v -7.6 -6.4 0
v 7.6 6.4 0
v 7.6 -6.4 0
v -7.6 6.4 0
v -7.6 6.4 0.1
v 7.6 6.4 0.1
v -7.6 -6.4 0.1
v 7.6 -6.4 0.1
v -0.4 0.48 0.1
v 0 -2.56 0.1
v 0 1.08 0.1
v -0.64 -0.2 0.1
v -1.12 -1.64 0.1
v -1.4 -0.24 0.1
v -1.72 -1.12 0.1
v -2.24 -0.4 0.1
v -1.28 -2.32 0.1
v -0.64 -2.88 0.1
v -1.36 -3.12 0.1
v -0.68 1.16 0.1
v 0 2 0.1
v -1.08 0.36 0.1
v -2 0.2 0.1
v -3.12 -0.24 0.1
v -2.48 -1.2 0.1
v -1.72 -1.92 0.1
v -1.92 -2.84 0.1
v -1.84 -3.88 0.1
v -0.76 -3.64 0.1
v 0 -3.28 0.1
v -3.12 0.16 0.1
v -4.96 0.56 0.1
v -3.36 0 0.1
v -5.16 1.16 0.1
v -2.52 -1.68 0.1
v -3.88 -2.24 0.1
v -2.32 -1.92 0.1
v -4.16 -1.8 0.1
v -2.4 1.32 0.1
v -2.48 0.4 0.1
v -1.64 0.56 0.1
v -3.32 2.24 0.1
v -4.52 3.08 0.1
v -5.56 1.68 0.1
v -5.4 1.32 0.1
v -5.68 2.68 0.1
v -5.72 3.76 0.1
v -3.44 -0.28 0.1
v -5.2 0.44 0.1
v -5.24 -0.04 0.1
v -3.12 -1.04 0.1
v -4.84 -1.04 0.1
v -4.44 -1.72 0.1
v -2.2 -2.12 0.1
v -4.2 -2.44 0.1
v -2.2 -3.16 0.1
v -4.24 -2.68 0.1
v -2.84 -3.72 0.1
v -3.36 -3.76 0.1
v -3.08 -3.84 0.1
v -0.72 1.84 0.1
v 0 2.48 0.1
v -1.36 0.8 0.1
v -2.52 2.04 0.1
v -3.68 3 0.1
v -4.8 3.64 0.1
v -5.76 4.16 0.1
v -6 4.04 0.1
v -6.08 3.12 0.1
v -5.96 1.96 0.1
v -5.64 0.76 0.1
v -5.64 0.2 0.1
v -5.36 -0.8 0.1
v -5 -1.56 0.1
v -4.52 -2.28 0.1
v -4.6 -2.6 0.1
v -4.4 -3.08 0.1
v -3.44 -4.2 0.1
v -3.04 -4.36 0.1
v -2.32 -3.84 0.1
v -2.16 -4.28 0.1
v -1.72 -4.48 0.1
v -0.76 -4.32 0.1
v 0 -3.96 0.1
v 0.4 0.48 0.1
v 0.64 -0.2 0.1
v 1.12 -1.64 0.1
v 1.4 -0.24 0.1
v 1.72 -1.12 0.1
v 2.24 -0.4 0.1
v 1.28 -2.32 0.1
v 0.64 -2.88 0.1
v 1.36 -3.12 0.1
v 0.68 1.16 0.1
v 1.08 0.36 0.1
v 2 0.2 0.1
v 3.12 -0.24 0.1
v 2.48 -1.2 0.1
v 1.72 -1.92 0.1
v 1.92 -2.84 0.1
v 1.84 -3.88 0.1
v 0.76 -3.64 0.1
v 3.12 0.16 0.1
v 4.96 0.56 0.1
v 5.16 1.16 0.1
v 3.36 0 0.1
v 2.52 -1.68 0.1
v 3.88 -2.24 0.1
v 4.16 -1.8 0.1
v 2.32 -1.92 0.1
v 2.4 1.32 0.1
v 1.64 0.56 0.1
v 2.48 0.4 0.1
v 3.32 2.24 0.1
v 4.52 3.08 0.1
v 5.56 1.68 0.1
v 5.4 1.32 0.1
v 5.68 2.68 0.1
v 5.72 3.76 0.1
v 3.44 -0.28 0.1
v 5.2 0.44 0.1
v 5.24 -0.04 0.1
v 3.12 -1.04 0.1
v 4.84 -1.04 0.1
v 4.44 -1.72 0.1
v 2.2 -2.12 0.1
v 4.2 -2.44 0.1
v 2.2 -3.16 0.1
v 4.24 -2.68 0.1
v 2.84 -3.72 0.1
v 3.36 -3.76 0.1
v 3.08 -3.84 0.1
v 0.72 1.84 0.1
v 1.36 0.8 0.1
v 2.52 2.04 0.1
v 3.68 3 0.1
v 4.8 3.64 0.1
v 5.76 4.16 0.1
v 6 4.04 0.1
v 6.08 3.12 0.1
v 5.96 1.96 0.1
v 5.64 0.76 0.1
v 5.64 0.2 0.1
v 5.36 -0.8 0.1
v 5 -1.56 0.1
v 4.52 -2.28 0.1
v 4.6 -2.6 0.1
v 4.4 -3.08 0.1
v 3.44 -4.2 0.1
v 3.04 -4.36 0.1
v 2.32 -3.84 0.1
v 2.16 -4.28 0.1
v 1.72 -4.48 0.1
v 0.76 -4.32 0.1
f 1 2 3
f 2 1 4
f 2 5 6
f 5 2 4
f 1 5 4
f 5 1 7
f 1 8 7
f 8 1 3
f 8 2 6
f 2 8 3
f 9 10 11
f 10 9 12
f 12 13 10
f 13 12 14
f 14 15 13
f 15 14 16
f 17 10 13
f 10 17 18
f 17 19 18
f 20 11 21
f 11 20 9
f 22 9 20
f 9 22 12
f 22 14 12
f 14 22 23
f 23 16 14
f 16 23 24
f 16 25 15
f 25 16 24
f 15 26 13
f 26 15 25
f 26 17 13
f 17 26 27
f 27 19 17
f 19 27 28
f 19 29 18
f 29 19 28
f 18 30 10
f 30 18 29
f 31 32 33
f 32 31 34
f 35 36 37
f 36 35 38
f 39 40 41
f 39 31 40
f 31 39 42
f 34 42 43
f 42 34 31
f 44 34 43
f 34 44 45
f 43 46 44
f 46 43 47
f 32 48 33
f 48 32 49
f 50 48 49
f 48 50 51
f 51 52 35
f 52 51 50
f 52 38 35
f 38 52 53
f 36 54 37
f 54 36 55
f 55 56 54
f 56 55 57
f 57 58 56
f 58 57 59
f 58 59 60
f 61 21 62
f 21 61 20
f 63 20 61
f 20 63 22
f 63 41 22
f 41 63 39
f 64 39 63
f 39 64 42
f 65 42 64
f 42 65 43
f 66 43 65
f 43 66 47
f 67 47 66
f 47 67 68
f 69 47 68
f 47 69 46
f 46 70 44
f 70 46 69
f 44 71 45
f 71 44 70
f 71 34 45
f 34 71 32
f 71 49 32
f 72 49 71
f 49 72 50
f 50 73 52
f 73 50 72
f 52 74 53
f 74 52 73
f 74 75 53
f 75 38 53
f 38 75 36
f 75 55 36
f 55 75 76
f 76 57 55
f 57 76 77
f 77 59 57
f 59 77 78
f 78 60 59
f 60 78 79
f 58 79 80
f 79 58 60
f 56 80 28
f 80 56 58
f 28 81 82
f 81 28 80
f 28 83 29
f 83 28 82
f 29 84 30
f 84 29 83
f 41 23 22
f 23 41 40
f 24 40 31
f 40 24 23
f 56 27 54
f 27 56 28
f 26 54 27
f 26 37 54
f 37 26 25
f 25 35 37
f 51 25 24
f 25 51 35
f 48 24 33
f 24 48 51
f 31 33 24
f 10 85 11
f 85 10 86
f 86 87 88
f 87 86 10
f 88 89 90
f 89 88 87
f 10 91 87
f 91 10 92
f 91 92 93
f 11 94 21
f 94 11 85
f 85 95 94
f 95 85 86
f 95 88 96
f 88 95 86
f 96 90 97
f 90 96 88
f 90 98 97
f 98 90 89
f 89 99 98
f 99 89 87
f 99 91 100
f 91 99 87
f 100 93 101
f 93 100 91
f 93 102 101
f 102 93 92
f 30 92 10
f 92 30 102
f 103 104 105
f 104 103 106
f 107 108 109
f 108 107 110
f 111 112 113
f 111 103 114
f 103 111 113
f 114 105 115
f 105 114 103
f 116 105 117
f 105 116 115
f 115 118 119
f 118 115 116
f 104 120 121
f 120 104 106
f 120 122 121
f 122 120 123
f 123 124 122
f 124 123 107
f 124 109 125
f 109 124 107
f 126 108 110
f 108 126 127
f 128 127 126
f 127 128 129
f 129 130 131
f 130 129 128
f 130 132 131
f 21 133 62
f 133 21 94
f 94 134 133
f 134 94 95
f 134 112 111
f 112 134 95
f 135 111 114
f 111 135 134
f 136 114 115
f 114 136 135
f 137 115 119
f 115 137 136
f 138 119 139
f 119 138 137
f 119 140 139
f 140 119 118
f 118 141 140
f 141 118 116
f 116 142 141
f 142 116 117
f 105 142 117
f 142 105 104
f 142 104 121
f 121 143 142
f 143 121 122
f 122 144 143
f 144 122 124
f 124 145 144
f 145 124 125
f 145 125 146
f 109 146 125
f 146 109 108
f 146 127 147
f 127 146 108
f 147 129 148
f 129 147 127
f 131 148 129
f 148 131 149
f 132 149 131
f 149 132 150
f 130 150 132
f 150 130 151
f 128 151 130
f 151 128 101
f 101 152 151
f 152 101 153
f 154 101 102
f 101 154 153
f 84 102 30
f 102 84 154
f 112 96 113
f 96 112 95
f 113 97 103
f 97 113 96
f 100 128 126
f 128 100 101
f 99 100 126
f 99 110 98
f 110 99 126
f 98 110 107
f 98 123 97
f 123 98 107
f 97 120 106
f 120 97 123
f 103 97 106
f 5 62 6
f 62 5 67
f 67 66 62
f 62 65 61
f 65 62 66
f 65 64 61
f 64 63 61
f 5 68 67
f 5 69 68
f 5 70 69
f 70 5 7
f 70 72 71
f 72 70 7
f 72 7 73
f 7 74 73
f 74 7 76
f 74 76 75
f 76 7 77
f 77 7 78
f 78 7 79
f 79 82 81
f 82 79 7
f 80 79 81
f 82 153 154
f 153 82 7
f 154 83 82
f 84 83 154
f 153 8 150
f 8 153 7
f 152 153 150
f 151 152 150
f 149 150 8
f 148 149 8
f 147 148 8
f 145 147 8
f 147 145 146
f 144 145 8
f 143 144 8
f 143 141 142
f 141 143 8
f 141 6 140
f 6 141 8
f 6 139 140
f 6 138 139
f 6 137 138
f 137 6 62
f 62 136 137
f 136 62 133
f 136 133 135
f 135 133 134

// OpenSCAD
// file: ../p/box5-12.scad
use <../lib.scad>
function ldraw_lib__box5_12() = [
// 0 Box with 5 Faces without Any Edges
// 0 Name: box5-12.dat
// 0 Author: Chris Dee [cwdee]
// 0 !LDRAW_ORG Primitive UPDATE 2009-02
// 0 !LICENSE Licensed under CC BY 2.0 and CC BY 4.0 : see CAreadme.txt
// 
// 0 BFC CERTIFY CCW
  [0,"BFC","CERTIFY"],
  [0,"BFC","CCW"],
// 
// 0 !HISTORY 2009-09-03 [PTadmin] Official Update 2009-02
// 
// 
// 4 16 1 1 1 1 1 -1 -1 1 -1 -1 1 1
  [4,16,1,1,1,1,1,-1,-1,1,-1,-1,1,1],
// 4 16 -1 0 1 1 0 1 1 1 1 -1 1 1
  [4,16,-1,0,1,1,0,1,1,1,1,-1,1,1],
// 4 16 -1 0 -1 -1 0 1 -1 1 1 -1 1 -1
  [4,16,-1,0,-1,-1,0,1,-1,1,1,-1,1,-1],
// 4 16 1 0 -1 -1 0 -1 -1 1 -1 1 1 -1
  [4,16,1,0,-1,-1,0,-1,-1,1,-1,1,1,-1],
// 4 16 1 0 1 1 0 -1 1 1 -1 1 1 1
  [4,16,1,0,1,1,0,-1,1,1,-1,1,1,1],
// 0
];
makepoly(ldraw_lib__box5_12(), line=0.2);
// main file
use <../lib.scad>
use <../p/box5-12.scad>
function ldraw_lib__4650853k() = [
// 0 Sticker  1.6 x  1.9 with Magenta Star on Butterfly Wings
// 0 Name: 4650853k.dat
// 0 Author: Takeshi Takahashi [RainbowDolphin]
// 0 !LDRAW_ORG Part UPDATE 2020-03
// 0 !LICENSE Licensed under CC BY 2.0 and CC BY 4.0 : see CAreadme.txt
// 
// 0 BFC CERTIFY CCW
  [0,"BFC","CERTIFY"],
  [0,"BFC","CCW"],
// 
// 0 !KEYWORDS Flying Club, Set 3063
// 
// 0 !HISTORY 2020-12-29 [PTadmin] Official Update 2020-03
// 
// 
// 1 16 0 -0.25 0 19 0 0 0 0.25 0 0 0 16 box5-12.dat
  [1,16,0,-0.25,0,19,0,0,0,0.25,0,0,0,16, ldraw_lib__box5_12()],
// 4 26 0 -0.25 -6.4 0 -0.25 2.7 -1 -0.25 1.2 -1.6 -0.25 -0.5
  [4,26,0,-0.25,-6.4,0,-0.25,2.7,-1,-0.25,1.2,-1.6,-0.25,-0.5],
// 4 26 -2.8 -0.25 -4.1 0 -0.25 -6.4 -1.6 -0.25 -0.5 -3.5 -0.25 -0.6
  [4,26,-2.8,-0.25,-4.1,0,-0.25,-6.4,-1.6,-0.25,-0.5,-3.5,-0.25,-0.6],
// 4 26 -4.3 -0.25 -2.8 -2.8 -0.25 -4.1 -3.5 -0.25 -0.6 -5.6 -0.25 -1
  [4,26,-4.3,-0.25,-2.8,-2.8,-0.25,-4.1,-3.5,-0.25,-0.6,-5.6,-0.25,-1],
// 4 26 0 -0.25 -6.4 -2.8 -0.25 -4.1 -3.2 -0.25 -5.8 -1.6 -0.25 -7.2
  [4,26,0,-0.25,-6.4,-2.8,-0.25,-4.1,-3.2,-0.25,-5.8,-1.6,-0.25,-7.2],
// 3 26 -3.2 -0.25 -5.8 -3.4 -0.25 -7.8 -1.6 -0.25 -7.2
  [3,26,-3.2,-0.25,-5.8,-3.4,-0.25,-7.8,-1.6,-0.25,-7.2],
// 4 13 0 -0.25 2.7 0 -0.25 5 -1.7 -0.25 2.9 -1 -0.25 1.2
  [4,13,0,-0.25,2.7,0,-0.25,5,-1.7,-0.25,2.9,-1,-0.25,1.2],
// 4 13 -1 -0.25 1.2 -1.7 -0.25 2.9 -2.7 -0.25 0.9 -1.6 -0.25 -0.5
  [4,13,-1,-0.25,1.2,-1.7,-0.25,2.9,-2.7,-0.25,0.9,-1.6,-0.25,-0.5],
// 4 13 -3.5 -0.25 -0.6 -1.6 -0.25 -0.5 -2.7 -0.25 0.9 -5 -0.25 0.5
  [4,13,-3.5,-0.25,-0.6,-1.6,-0.25,-0.5,-2.7,-0.25,0.9,-5,-0.25,0.5],
// 4 13 -5.6 -0.25 -1 -3.5 -0.25 -0.6 -5 -0.25 0.5 -7.8 -0.25 -0.6
  [4,13,-5.6,-0.25,-1,-3.5,-0.25,-0.6,-5,-0.25,0.5,-7.8,-0.25,-0.6],
// 4 13 -5.6 -0.25 -1 -7.8 -0.25 -0.6 -6.2 -0.25 -3 -4.3 -0.25 -2.8
  [4,13,-5.6,-0.25,-1,-7.8,-0.25,-0.6,-6.2,-0.25,-3,-4.3,-0.25,-2.8],
// 4 13 -4.3 -0.25 -2.8 -6.2 -0.25 -3 -4.3 -0.25 -4.8 -2.8 -0.25 -4.1
  [4,13,-4.3,-0.25,-2.8,-6.2,-0.25,-3,-4.3,-0.25,-4.8,-2.8,-0.25,-4.1],
// 4 13 -3.2 -0.25 -5.8 -2.8 -0.25 -4.1 -4.3 -0.25 -4.8 -4.8 -0.25 -7.1
  [4,13,-3.2,-0.25,-5.8,-2.8,-0.25,-4.1,-4.3,-0.25,-4.8,-4.8,-0.25,-7.1],
// 4 13 -3.4 -0.25 -7.8 -3.2 -0.25 -5.8 -4.8 -0.25 -7.1 -4.6 -0.25 -9.7
  [4,13,-3.4,-0.25,-7.8,-3.2,-0.25,-5.8,-4.8,-0.25,-7.1,-4.6,-0.25,-9.7],
// 4 13 -3.4 -0.25 -7.8 -4.6 -0.25 -9.7 -1.9 -0.25 -9.1 -1.6 -0.25 -7.2
  [4,13,-3.4,-0.25,-7.8,-4.6,-0.25,-9.7,-1.9,-0.25,-9.1,-1.6,-0.25,-7.2],
// 4 13 -1.6 -0.25 -7.2 -1.9 -0.25 -9.1 0 -0.25 -8.2 0 -0.25 -6.4
  [4,13,-1.6,-0.25,-7.2,-1.9,-0.25,-9.1,0,-0.25,-8.2,0,-0.25,-6.4],
// 4 26 -7.8 -0.25 0.4 -12.9 -0.25 2.9 -12.4 -0.25 1.4 -8.4 -0.25 0
  [4,26,-7.8,-0.25,0.4,-12.9,-0.25,2.9,-12.4,-0.25,1.4,-8.4,-0.25,0],
// 4 26 -6.3 -0.25 -4.2 -10.4 -0.25 -4.5 -9.7 -0.25 -5.6 -5.8 -0.25 -4.8
  [4,26,-6.3,-0.25,-4.2,-10.4,-0.25,-4.5,-9.7,-0.25,-5.6,-5.8,-0.25,-4.8],
// 3 323 -6 -0.25 3.3 -6.2 -0.25 1 -4.1 -0.25 1.4
  [3,323,-6,-0.25,3.3,-6.2,-0.25,1,-4.1,-0.25,1.4],
// 4 323 -6.2 -0.25 1 -6 -0.25 3.3 -8.3 -0.25 5.6 -7.8 -0.25 0.4
  [4,323,-6.2,-0.25,1,-6,-0.25,3.3,-8.3,-0.25,5.6,-7.8,-0.25,0.4],
// 4 323 -12.9 -0.25 2.9 -7.8 -0.25 0.4 -8.3 -0.25 5.6 -11.3 -0.25 7.7
  [4,323,-12.9,-0.25,2.9,-7.8,-0.25,0.4,-8.3,-0.25,5.6,-11.3,-0.25,7.7],
// 4 323 -13.5 -0.25 3.3 -12.9 -0.25 2.9 -11.3 -0.25 7.7 -13.9 -0.25 4.2
  [4,323,-13.5,-0.25,3.3,-12.9,-0.25,2.9,-11.3,-0.25,7.7,-13.9,-0.25,4.2],
// 4 323 -14.2 -0.25 6.7 -13.9 -0.25 4.2 -11.3 -0.25 7.7 -14.3 -0.25 9.4
  [4,323,-14.2,-0.25,6.7,-13.9,-0.25,4.2,-11.3,-0.25,7.7,-14.3,-0.25,9.4],
// 4 323 -8.4 -0.25 0 -12.4 -0.25 1.4 -13 -0.25 1.1 -8.6 -0.25 -0.7
  [4,323,-8.4,-0.25,0,-12.4,-0.25,1.4,-13,-0.25,1.1,-8.6,-0.25,-0.7],
// 4 323 -8.6 -0.25 -0.7 -13 -0.25 1.1 -13.1 -0.25 -0.1 -7.8 -0.25 -2.6
  [4,323,-8.6,-0.25,-0.7,-13,-0.25,1.1,-13.1,-0.25,-0.1,-7.8,-0.25,-2.6],
// 4 323 -7.8 -0.25 -2.6 -13.1 -0.25 -0.1 -12.1 -0.25 -2.6 -6.3 -0.25 -4.2
  [4,323,-7.8,-0.25,-2.6,-13.1,-0.25,-0.1,-12.1,-0.25,-2.6,-6.3,-0.25,-4.2],
// 4 323 -10.4 -0.25 -4.5 -6.3 -0.25 -4.2 -12.1 -0.25 -2.6 -11.1 -0.25 -4.3
  [4,323,-10.4,-0.25,-4.5,-6.3,-0.25,-4.2,-12.1,-0.25,-2.6,-11.1,-0.25,-4.3],
// 4 323 -5.5 -0.25 -5.3 -5.8 -0.25 -4.8 -9.7 -0.25 -5.6 -10.5 -0.25 -6.1
  [4,323,-5.5,-0.25,-5.3,-5.8,-0.25,-4.8,-9.7,-0.25,-5.6,-10.5,-0.25,-6.1],
// 4 323 -5.5 -0.25 -7.9 -5.5 -0.25 -5.3 -10.5 -0.25 -6.1 -10.6 -0.25 -6.7
  [4,323,-5.5,-0.25,-7.9,-5.5,-0.25,-5.3,-10.5,-0.25,-6.1,-10.6,-0.25,-6.7],
// 4 323 -7.1 -0.25 -9.3 -5.5 -0.25 -7.9 -10.6 -0.25 -6.7 -8.4 -0.25 -9.4
  [4,323,-7.1,-0.25,-9.3,-5.5,-0.25,-7.9,-10.6,-0.25,-6.7,-8.4,-0.25,-9.4],
// 3 323 -7.1 -0.25 -9.3 -8.4 -0.25 -9.4 -7.7 -0.25 -9.6
  [3,323,-7.1,-0.25,-9.3,-8.4,-0.25,-9.4,-7.7,-0.25,-9.6],
// 4 15 0 -0.25 5 0 -0.25 6.2 -1.8 -0.25 4.6 -1.7 -0.25 2.9
  [4,15,0,-0.25,5,0,-0.25,6.2,-1.8,-0.25,4.6,-1.7,-0.25,2.9],
// 4 15 -1.7 -0.25 2.9 -1.8 -0.25 4.6 -3.4 -0.25 2 -2.7 -0.25 0.9
  [4,15,-1.7,-0.25,2.9,-1.8,-0.25,4.6,-3.4,-0.25,2,-2.7,-0.25,0.9],
// 4 15 -4.1 -0.25 1.4 -2.7 -0.25 0.9 -3.4 -0.25 2 -6 -0.25 3.3
  [4,15,-4.1,-0.25,1.4,-2.7,-0.25,0.9,-3.4,-0.25,2,-6,-0.25,3.3],
// 4 15 -6 -0.25 3.3 -3.4 -0.25 2 -6.3 -0.25 5.1 -8.3 -0.25 5.6
  [4,15,-6,-0.25,3.3,-3.4,-0.25,2,-6.3,-0.25,5.1,-8.3,-0.25,5.6],
// 4 15 -8.3 -0.25 5.6 -6.3 -0.25 5.1 -9.2 -0.25 7.5 -11.3 -0.25 7.7
  [4,15,-8.3,-0.25,5.6,-6.3,-0.25,5.1,-9.2,-0.25,7.5,-11.3,-0.25,7.7],
// 4 15 -11.3 -0.25 7.7 -9.2 -0.25 7.5 -12 -0.25 9.1 -14.3 -0.25 9.4
  [4,15,-11.3,-0.25,7.7,-9.2,-0.25,7.5,-12,-0.25,9.1,-14.3,-0.25,9.4],
// 4 15 -14.3 -0.25 9.4 -12 -0.25 9.1 -14.4 -0.25 10.4 -15 -0.25 10.1
  [4,15,-14.3,-0.25,9.4,-12,-0.25,9.1,-14.4,-0.25,10.4,-15,-0.25,10.1],
// 4 15 -14.3 -0.25 9.4 -15 -0.25 10.1 -15.2 -0.25 7.8 -14.2 -0.25 6.7
  [4,15,-14.3,-0.25,9.4,-15,-0.25,10.1,-15.2,-0.25,7.8,-14.2,-0.25,6.7],
// 4 15 -14.2 -0.25 6.7 -15.2 -0.25 7.8 -14.9 -0.25 4.9 -13.9 -0.25 4.2
  [4,15,-14.2,-0.25,6.7,-15.2,-0.25,7.8,-14.9,-0.25,4.9,-13.9,-0.25,4.2],
// 4 15 -13.9 -0.25 4.2 -14.9 -0.25 4.9 -14.1 -0.25 1.9 -13.5 -0.25 3.3
  [4,15,-13.9,-0.25,4.2,-14.9,-0.25,4.9,-14.1,-0.25,1.9,-13.5,-0.25,3.3],
// 4 15 -12.9 -0.25 2.9 -13.5 -0.25 3.3 -14.1 -0.25 1.9 -12.4 -0.25 1.4
  [4,15,-12.9,-0.25,2.9,-13.5,-0.25,3.3,-14.1,-0.25,1.9,-12.4,-0.25,1.4],
// 3 15 -14.1 -0.25 1.9 -13 -0.25 1.1 -12.4 -0.25 1.4
  [3,15,-14.1,-0.25,1.9,-13,-0.25,1.1,-12.4,-0.25,1.4],
// 4 15 -13 -0.25 1.1 -14.1 -0.25 1.9 -14.1 -0.25 0.5 -13.1 -0.25 -0.1
  [4,15,-13,-0.25,1.1,-14.1,-0.25,1.9,-14.1,-0.25,0.5,-13.1,-0.25,-0.1],
// 4 15 -13.1 -0.25 -0.1 -14.1 -0.25 0.5 -13.4 -0.25 -2 -12.1 -0.25 -2.6
  [4,15,-13.1,-0.25,-0.1,-14.1,-0.25,0.5,-13.4,-0.25,-2,-12.1,-0.25,-2.6],
// 4 15 -12.1 -0.25 -2.6 -13.4 -0.25 -2 -12.5 -0.25 -3.9 -11.1 -0.25 -4.3
  [4,15,-12.1,-0.25,-2.6,-13.4,-0.25,-2,-12.5,-0.25,-3.9,-11.1,-0.25,-4.3],
// 3 15 -12.5 -0.25 -3.9 -11.3 -0.25 -5.7 -11.1 -0.25 -4.3
  [3,15,-12.5,-0.25,-3.9,-11.3,-0.25,-5.7,-11.1,-0.25,-4.3],
// 4 15 -10.4 -0.25 -4.5 -11.1 -0.25 -4.3 -11.3 -0.25 -5.7 -9.7 -0.25 -5.6
  [4,15,-10.4,-0.25,-4.5,-11.1,-0.25,-4.3,-11.3,-0.25,-5.7,-9.7,-0.25,-5.6],
// 4 15 -10.5 -0.25 -6.1 -9.7 -0.25 -5.6 -11.3 -0.25 -5.7 -11.5 -0.25 -6.5
  [4,15,-10.5,-0.25,-6.1,-9.7,-0.25,-5.6,-11.3,-0.25,-5.7,-11.5,-0.25,-6.5],
// 4 15 -10.6 -0.25 -6.7 -10.5 -0.25 -6.1 -11.5 -0.25 -6.5 -11 -0.25 -7.7
  [4,15,-10.6,-0.25,-6.7,-10.5,-0.25,-6.1,-11.5,-0.25,-6.5,-11,-0.25,-7.7],
// 4 15 -8.4 -0.25 -9.4 -10.6 -0.25 -6.7 -11 -0.25 -7.7 -8.6 -0.25 -10.5
  [4,15,-8.4,-0.25,-9.4,-10.6,-0.25,-6.7,-11,-0.25,-7.7,-8.6,-0.25,-10.5],
// 4 15 -7.7 -0.25 -9.6 -8.4 -0.25 -9.4 -8.6 -0.25 -10.5 -7.6 -0.25 -10.9
  [4,15,-7.7,-0.25,-9.6,-8.4,-0.25,-9.4,-8.6,-0.25,-10.5,-7.6,-0.25,-10.9],
// 4 15 -7.1 -0.25 -9.3 -7.7 -0.25 -9.6 -7.6 -0.25 -10.9 -5.8 -0.25 -9.6
  [4,15,-7.1,-0.25,-9.3,-7.7,-0.25,-9.6,-7.6,-0.25,-10.9,-5.8,-0.25,-9.6],
// 4 15 -5.5 -0.25 -7.9 -7.1 -0.25 -9.3 -5.8 -0.25 -9.6 -4.6 -0.25 -9.7
  [4,15,-5.5,-0.25,-7.9,-7.1,-0.25,-9.3,-5.8,-0.25,-9.6,-4.6,-0.25,-9.7],
// 4 15 -4.6 -0.25 -9.7 -5.8 -0.25 -9.6 -5.4 -0.25 -10.7 -4.3 -0.25 -11.2
  [4,15,-4.6,-0.25,-9.7,-5.8,-0.25,-9.6,-5.4,-0.25,-10.7,-4.3,-0.25,-11.2],
// 4 15 -1.9 -0.25 -9.1 -4.6 -0.25 -9.7 -4.3 -0.25 -11.2 -1.9 -0.25 -10.8
  [4,15,-1.9,-0.25,-9.1,-4.6,-0.25,-9.7,-4.3,-0.25,-11.2,-1.9,-0.25,-10.8],
// 4 15 0 -0.25 -8.2 -1.9 -0.25 -9.1 -1.9 -0.25 -10.8 0 -0.25 -9.9
  [4,15,0,-0.25,-8.2,-1.9,-0.25,-9.1,-1.9,-0.25,-10.8,0,-0.25,-9.9],
// 4 15 -5 -0.25 0.5 -2.7 -0.25 0.9 -4.1 -0.25 1.4 -6.2 -0.25 1
  [4,15,-5,-0.25,0.5,-2.7,-0.25,0.9,-4.1,-0.25,1.4,-6.2,-0.25,1],
// 4 15 -7.8 -0.25 -0.6 -5 -0.25 0.5 -6.2 -0.25 1 -7.8 -0.25 0.4
  [4,15,-7.8,-0.25,-0.6,-5,-0.25,0.5,-6.2,-0.25,1,-7.8,-0.25,0.4],
// 4 15 -5.5 -0.25 -7.9 -4.6 -0.25 -9.7 -4.8 -0.25 -7.1 -5.5 -0.25 -5.3
  [4,15,-5.5,-0.25,-7.9,-4.6,-0.25,-9.7,-4.8,-0.25,-7.1,-5.5,-0.25,-5.3],
// 3 15 -4.3 -0.25 -4.8 -5.5 -0.25 -5.3 -4.8 -0.25 -7.1
  [3,15,-4.3,-0.25,-4.8,-5.5,-0.25,-5.3,-4.8,-0.25,-7.1],
// 4 15 -5.8 -0.25 -4.8 -5.5 -0.25 -5.3 -4.3 -0.25 -4.8 -6.2 -0.25 -3
  [4,15,-5.8,-0.25,-4.8,-5.5,-0.25,-5.3,-4.3,-0.25,-4.8,-6.2,-0.25,-3],
// 3 15 -6.2 -0.25 -3 -6.3 -0.25 -4.2 -5.8 -0.25 -4.8
  [3,15,-6.2,-0.25,-3,-6.3,-0.25,-4.2,-5.8,-0.25,-4.8],
// 4 15 -7.8 -0.25 -2.6 -6.3 -0.25 -4.2 -6.2 -0.25 -3 -7.8 -0.25 -0.6
  [4,15,-7.8,-0.25,-2.6,-6.3,-0.25,-4.2,-6.2,-0.25,-3,-7.8,-0.25,-0.6],
// 4 15 -8.6 -0.25 -0.7 -7.8 -0.25 -2.6 -7.8 -0.25 -0.6 -8.4 -0.25 0
  [4,15,-8.6,-0.25,-0.7,-7.8,-0.25,-2.6,-7.8,-0.25,-0.6,-8.4,-0.25,0],
// 3 15 -7.8 -0.25 0.4 -8.4 -0.25 0 -7.8 -0.25 -0.6
  [3,15,-7.8,-0.25,0.4,-8.4,-0.25,0,-7.8,-0.25,-0.6],
// 4 26 1 -0.25 1.2 0 -0.25 2.7 0 -0.25 -6.4 1.6 -0.25 -0.5
  [4,26,1,-0.25,1.2,0,-0.25,2.7,0,-0.25,-6.4,1.6,-0.25,-0.5],
// 4 26 1.6 -0.25 -0.5 0 -0.25 -6.4 2.8 -0.25 -4.1 3.5 -0.25 -0.6
  [4,26,1.6,-0.25,-0.5,0,-0.25,-6.4,2.8,-0.25,-4.1,3.5,-0.25,-0.6],
// 4 26 3.5 -0.25 -0.6 2.8 -0.25 -4.1 4.3 -0.25 -2.8 5.6 -0.25 -1
  [4,26,3.5,-0.25,-0.6,2.8,-0.25,-4.1,4.3,-0.25,-2.8,5.6,-0.25,-1],
// 4 26 3.2 -0.25 -5.8 2.8 -0.25 -4.1 0 -0.25 -6.4 1.6 -0.25 -7.2
  [4,26,3.2,-0.25,-5.8,2.8,-0.25,-4.1,0,-0.25,-6.4,1.6,-0.25,-7.2],
// 3 26 3.2 -0.25 -5.8 1.6 -0.25 -7.2 3.4 -0.25 -7.8
  [3,26,3.2,-0.25,-5.8,1.6,-0.25,-7.2,3.4,-0.25,-7.8],
// 4 13 1.7 -0.25 2.9 0 -0.25 5 0 -0.25 2.7 1 -0.25 1.2
  [4,13,1.7,-0.25,2.9,0,-0.25,5,0,-0.25,2.7,1,-0.25,1.2],
// 4 13 2.7 -0.25 0.9 1.7 -0.25 2.9 1 -0.25 1.2 1.6 -0.25 -0.5
  [4,13,2.7,-0.25,0.9,1.7,-0.25,2.9,1,-0.25,1.2,1.6,-0.25,-0.5],
// 4 13 2.7 -0.25 0.9 1.6 -0.25 -0.5 3.5 -0.25 -0.6 5 -0.25 0.5
  [4,13,2.7,-0.25,0.9,1.6,-0.25,-0.5,3.5,-0.25,-0.6,5,-0.25,0.5],
// 4 13 5 -0.25 0.5 3.5 -0.25 -0.6 5.6 -0.25 -1 7.8 -0.25 -0.6
  [4,13,5,-0.25,0.5,3.5,-0.25,-0.6,5.6,-0.25,-1,7.8,-0.25,-0.6],
// 4 13 6.2 -0.25 -3 7.8 -0.25 -0.6 5.6 -0.25 -1 4.3 -0.25 -2.8
  [4,13,6.2,-0.25,-3,7.8,-0.25,-0.6,5.6,-0.25,-1,4.3,-0.25,-2.8],
// 4 13 4.3 -0.25 -4.8 6.2 -0.25 -3 4.3 -0.25 -2.8 2.8 -0.25 -4.1
  [4,13,4.3,-0.25,-4.8,6.2,-0.25,-3,4.3,-0.25,-2.8,2.8,-0.25,-4.1],
// 4 13 4.3 -0.25 -4.8 2.8 -0.25 -4.1 3.2 -0.25 -5.8 4.8 -0.25 -7.1
  [4,13,4.3,-0.25,-4.8,2.8,-0.25,-4.1,3.2,-0.25,-5.8,4.8,-0.25,-7.1],
// 4 13 4.8 -0.25 -7.1 3.2 -0.25 -5.8 3.4 -0.25 -7.8 4.6 -0.25 -9.7
  [4,13,4.8,-0.25,-7.1,3.2,-0.25,-5.8,3.4,-0.25,-7.8,4.6,-0.25,-9.7],
// 4 13 1.9 -0.25 -9.1 4.6 -0.25 -9.7 3.4 -0.25 -7.8 1.6 -0.25 -7.2
  [4,13,1.9,-0.25,-9.1,4.6,-0.25,-9.7,3.4,-0.25,-7.8,1.6,-0.25,-7.2],
// 4 13 0 -0.25 -8.2 1.9 -0.25 -9.1 1.6 -0.25 -7.2 0 -0.25 -6.4
  [4,13,0,-0.25,-8.2,1.9,-0.25,-9.1,1.6,-0.25,-7.2,0,-0.25,-6.4],
// 4 26 12.4 -0.25 1.4 12.9 -0.25 2.9 7.8 -0.25 0.4 8.4 -0.25 0
  [4,26,12.4,-0.25,1.4,12.9,-0.25,2.9,7.8,-0.25,0.4,8.4,-0.25,0],
// 4 26 9.7 -0.25 -5.6 10.4 -0.25 -4.5 6.3 -0.25 -4.2 5.8 -0.25 -4.8
  [4,26,9.7,-0.25,-5.6,10.4,-0.25,-4.5,6.3,-0.25,-4.2,5.8,-0.25,-4.8],
// 3 323 6 -0.25 3.3 4.1 -0.25 1.4 6.2 -0.25 1
  [3,323,6,-0.25,3.3,4.1,-0.25,1.4,6.2,-0.25,1],
// 4 323 8.3 -0.25 5.6 6 -0.25 3.3 6.2 -0.25 1 7.8 -0.25 0.4
  [4,323,8.3,-0.25,5.6,6,-0.25,3.3,6.2,-0.25,1,7.8,-0.25,0.4],
// 4 323 8.3 -0.25 5.6 7.8 -0.25 0.4 12.9 -0.25 2.9 11.3 -0.25 7.7
  [4,323,8.3,-0.25,5.6,7.8,-0.25,0.4,12.9,-0.25,2.9,11.3,-0.25,7.7],
// 4 323 11.3 -0.25 7.7 12.9 -0.25 2.9 13.5 -0.25 3.3 13.9 -0.25 4.2
  [4,323,11.3,-0.25,7.7,12.9,-0.25,2.9,13.5,-0.25,3.3,13.9,-0.25,4.2],
// 4 323 11.3 -0.25 7.7 13.9 -0.25 4.2 14.2 -0.25 6.7 14.3 -0.25 9.4
  [4,323,11.3,-0.25,7.7,13.9,-0.25,4.2,14.2,-0.25,6.7,14.3,-0.25,9.4],
// 4 323 13 -0.25 1.1 12.4 -0.25 1.4 8.4 -0.25 0 8.6 -0.25 -0.7
  [4,323,13,-0.25,1.1,12.4,-0.25,1.4,8.4,-0.25,0,8.6,-0.25,-0.7],
// 4 323 13.1 -0.25 -0.1 13 -0.25 1.1 8.6 -0.25 -0.7 7.8 -0.25 -2.6
  [4,323,13.1,-0.25,-0.1,13,-0.25,1.1,8.6,-0.25,-0.7,7.8,-0.25,-2.6],
// 4 323 12.1 -0.25 -2.6 13.1 -0.25 -0.1 7.8 -0.25 -2.6 6.3 -0.25 -4.2
  [4,323,12.1,-0.25,-2.6,13.1,-0.25,-0.1,7.8,-0.25,-2.6,6.3,-0.25,-4.2],
// 4 323 12.1 -0.25 -2.6 6.3 -0.25 -4.2 10.4 -0.25 -4.5 11.1 -0.25 -4.3
  [4,323,12.1,-0.25,-2.6,6.3,-0.25,-4.2,10.4,-0.25,-4.5,11.1,-0.25,-4.3],
// 4 323 9.7 -0.25 -5.6 5.8 -0.25 -4.8 5.5 -0.25 -5.3 10.5 -0.25 -6.1
  [4,323,9.7,-0.25,-5.6,5.8,-0.25,-4.8,5.5,-0.25,-5.3,10.5,-0.25,-6.1],
// 4 323 10.5 -0.25 -6.1 5.5 -0.25 -5.3 5.5 -0.25 -7.9 10.6 -0.25 -6.7
  [4,323,10.5,-0.25,-6.1,5.5,-0.25,-5.3,5.5,-0.25,-7.9,10.6,-0.25,-6.7],
// 4 323 10.6 -0.25 -6.7 5.5 -0.25 -7.9 7.1 -0.25 -9.3 8.4 -0.25 -9.4
  [4,323,10.6,-0.25,-6.7,5.5,-0.25,-7.9,7.1,-0.25,-9.3,8.4,-0.25,-9.4],
// 3 323 7.1 -0.25 -9.3 7.7 -0.25 -9.6 8.4 -0.25 -9.4
  [3,323,7.1,-0.25,-9.3,7.7,-0.25,-9.6,8.4,-0.25,-9.4],
// 4 15 1.8 -0.25 4.6 0 -0.25 6.2 0 -0.25 5 1.7 -0.25 2.9
  [4,15,1.8,-0.25,4.6,0,-0.25,6.2,0,-0.25,5,1.7,-0.25,2.9],
// 4 15 3.4 -0.25 2 1.8 -0.25 4.6 1.7 -0.25 2.9 2.7 -0.25 0.9
  [4,15,3.4,-0.25,2,1.8,-0.25,4.6,1.7,-0.25,2.9,2.7,-0.25,0.9],
// 4 15 3.4 -0.25 2 2.7 -0.25 0.9 4.1 -0.25 1.4 6 -0.25 3.3
  [4,15,3.4,-0.25,2,2.7,-0.25,0.9,4.1,-0.25,1.4,6,-0.25,3.3],
// 4 15 6.3 -0.25 5.1 3.4 -0.25 2 6 -0.25 3.3 8.3 -0.25 5.6
  [4,15,6.3,-0.25,5.1,3.4,-0.25,2,6,-0.25,3.3,8.3,-0.25,5.6],
// 4 15 9.2 -0.25 7.5 6.3 -0.25 5.1 8.3 -0.25 5.6 11.3 -0.25 7.7
  [4,15,9.2,-0.25,7.5,6.3,-0.25,5.1,8.3,-0.25,5.6,11.3,-0.25,7.7],
// 4 15 12 -0.25 9.1 9.2 -0.25 7.5 11.3 -0.25 7.7 14.3 -0.25 9.4
  [4,15,12,-0.25,9.1,9.2,-0.25,7.5,11.3,-0.25,7.7,14.3,-0.25,9.4],
// 4 15 14.4 -0.25 10.4 12 -0.25 9.1 14.3 -0.25 9.4 15 -0.25 10.1
  [4,15,14.4,-0.25,10.4,12,-0.25,9.1,14.3,-0.25,9.4,15,-0.25,10.1],
// 4 15 15.2 -0.25 7.8 15 -0.25 10.1 14.3 -0.25 9.4 14.2 -0.25 6.7
  [4,15,15.2,-0.25,7.8,15,-0.25,10.1,14.3,-0.25,9.4,14.2,-0.25,6.7],
// 4 15 14.9 -0.25 4.9 15.2 -0.25 7.8 14.2 -0.25 6.7 13.9 -0.25 4.2
  [4,15,14.9,-0.25,4.9,15.2,-0.25,7.8,14.2,-0.25,6.7,13.9,-0.25,4.2],
// 4 15 14.1 -0.25 1.9 14.9 -0.25 4.9 13.9 -0.25 4.2 13.5 -0.25 3.3
  [4,15,14.1,-0.25,1.9,14.9,-0.25,4.9,13.9,-0.25,4.2,13.5,-0.25,3.3],
// 4 15 14.1 -0.25 1.9 13.5 -0.25 3.3 12.9 -0.25 2.9 12.4 -0.25 1.4
  [4,15,14.1,-0.25,1.9,13.5,-0.25,3.3,12.9,-0.25,2.9,12.4,-0.25,1.4],
// 3 15 14.1 -0.25 1.9 12.4 -0.25 1.4 13 -0.25 1.1
  [3,15,14.1,-0.25,1.9,12.4,-0.25,1.4,13,-0.25,1.1],
// 4 15 14.1 -0.25 0.5 14.1 -0.25 1.9 13 -0.25 1.1 13.1 -0.25 -0.1
  [4,15,14.1,-0.25,0.5,14.1,-0.25,1.9,13,-0.25,1.1,13.1,-0.25,-0.1],
// 4 15 13.4 -0.25 -2 14.1 -0.25 0.5 13.1 -0.25 -0.1 12.1 -0.25 -2.6
  [4,15,13.4,-0.25,-2,14.1,-0.25,0.5,13.1,-0.25,-0.1,12.1,-0.25,-2.6],
// 4 15 12.5 -0.25 -3.9 13.4 -0.25 -2 12.1 -0.25 -2.6 11.1 -0.25 -4.3
  [4,15,12.5,-0.25,-3.9,13.4,-0.25,-2,12.1,-0.25,-2.6,11.1,-0.25,-4.3],
// 3 15 12.5 -0.25 -3.9 11.1 -0.25 -4.3 11.3 -0.25 -5.7
  [3,15,12.5,-0.25,-3.9,11.1,-0.25,-4.3,11.3,-0.25,-5.7],
// 4 15 11.3 -0.25 -5.7 11.1 -0.25 -4.3 10.4 -0.25 -4.5 9.7 -0.25 -5.6
  [4,15,11.3,-0.25,-5.7,11.1,-0.25,-4.3,10.4,-0.25,-4.5,9.7,-0.25,-5.6],
// 4 15 11.3 -0.25 -5.7 9.7 -0.25 -5.6 10.5 -0.25 -6.1 11.5 -0.25 -6.5
  [4,15,11.3,-0.25,-5.7,9.7,-0.25,-5.6,10.5,-0.25,-6.1,11.5,-0.25,-6.5],
// 4 15 11.5 -0.25 -6.5 10.5 -0.25 -6.1 10.6 -0.25 -6.7 11 -0.25 -7.7
  [4,15,11.5,-0.25,-6.5,10.5,-0.25,-6.1,10.6,-0.25,-6.7,11,-0.25,-7.7],
// 4 15 11 -0.25 -7.7 10.6 -0.25 -6.7 8.4 -0.25 -9.4 8.6 -0.25 -10.5
  [4,15,11,-0.25,-7.7,10.6,-0.25,-6.7,8.4,-0.25,-9.4,8.6,-0.25,-10.5],
// 4 15 8.6 -0.25 -10.5 8.4 -0.25 -9.4 7.7 -0.25 -9.6 7.6 -0.25 -10.9
  [4,15,8.6,-0.25,-10.5,8.4,-0.25,-9.4,7.7,-0.25,-9.6,7.6,-0.25,-10.9],
// 4 15 7.6 -0.25 -10.9 7.7 -0.25 -9.6 7.1 -0.25 -9.3 5.8 -0.25 -9.6
  [4,15,7.6,-0.25,-10.9,7.7,-0.25,-9.6,7.1,-0.25,-9.3,5.8,-0.25,-9.6],
// 4 15 5.8 -0.25 -9.6 7.1 -0.25 -9.3 5.5 -0.25 -7.9 4.6 -0.25 -9.7
  [4,15,5.8,-0.25,-9.6,7.1,-0.25,-9.3,5.5,-0.25,-7.9,4.6,-0.25,-9.7],
// 4 15 5.4 -0.25 -10.7 5.8 -0.25 -9.6 4.6 -0.25 -9.7 4.3 -0.25 -11.2
  [4,15,5.4,-0.25,-10.7,5.8,-0.25,-9.6,4.6,-0.25,-9.7,4.3,-0.25,-11.2],
// 4 15 4.3 -0.25 -11.2 4.6 -0.25 -9.7 1.9 -0.25 -9.1 1.9 -0.25 -10.8
  [4,15,4.3,-0.25,-11.2,4.6,-0.25,-9.7,1.9,-0.25,-9.1,1.9,-0.25,-10.8],
// 4 15 1.9 -0.25 -10.8 1.9 -0.25 -9.1 0 -0.25 -8.2 0 -0.25 -9.9
  [4,15,1.9,-0.25,-10.8,1.9,-0.25,-9.1,0,-0.25,-8.2,0,-0.25,-9.9],
// 4 15 4.1 -0.25 1.4 2.7 -0.25 0.9 5 -0.25 0.5 6.2 -0.25 1
  [4,15,4.1,-0.25,1.4,2.7,-0.25,0.9,5,-0.25,0.5,6.2,-0.25,1],
// 4 15 6.2 -0.25 1 5 -0.25 0.5 7.8 -0.25 -0.6 7.8 -0.25 0.4
  [4,15,6.2,-0.25,1,5,-0.25,0.5,7.8,-0.25,-0.6,7.8,-0.25,0.4],
// 4 15 4.8 -0.25 -7.1 4.6 -0.25 -9.7 5.5 -0.25 -7.9 5.5 -0.25 -5.3
  [4,15,4.8,-0.25,-7.1,4.6,-0.25,-9.7,5.5,-0.25,-7.9,5.5,-0.25,-5.3],
// 3 15 4.3 -0.25 -4.8 4.8 -0.25 -7.1 5.5 -0.25 -5.3
  [3,15,4.3,-0.25,-4.8,4.8,-0.25,-7.1,5.5,-0.25,-5.3],
// 4 15 4.3 -0.25 -4.8 5.5 -0.25 -5.3 5.8 -0.25 -4.8 6.2 -0.25 -3
  [4,15,4.3,-0.25,-4.8,5.5,-0.25,-5.3,5.8,-0.25,-4.8,6.2,-0.25,-3],
// 3 15 6.2 -0.25 -3 5.8 -0.25 -4.8 6.3 -0.25 -4.2
  [3,15,6.2,-0.25,-3,5.8,-0.25,-4.8,6.3,-0.25,-4.2],
// 4 15 6.2 -0.25 -3 6.3 -0.25 -4.2 7.8 -0.25 -2.6 7.8 -0.25 -0.6
  [4,15,6.2,-0.25,-3,6.3,-0.25,-4.2,7.8,-0.25,-2.6,7.8,-0.25,-0.6],
// 4 15 7.8 -0.25 -0.6 7.8 -0.25 -2.6 8.6 -0.25 -0.7 8.4 -0.25 0
  [4,15,7.8,-0.25,-0.6,7.8,-0.25,-2.6,8.6,-0.25,-0.7,8.4,-0.25,0],
// 3 15 7.8 -0.25 0.4 7.8 -0.25 -0.6 8.4 -0.25 0
  [3,15,7.8,-0.25,0.4,7.8,-0.25,-0.6,8.4,-0.25,0],
// 4 322 0 -0.25 6.2 19 -0.25 16 -19 -0.25 16 -14.4 -0.25 10.4
  [4,322,0,-0.25,6.2,19,-0.25,16,-19,-0.25,16,-14.4,-0.25,10.4],
// 3 322 -14.4 -0.25 10.4 -12 -0.25 9.1 0 -0.25 6.2
  [3,322,-14.4,-0.25,10.4,-12,-0.25,9.1,0,-0.25,6.2],
// 4 322 0 -0.25 6.2 -12 -0.25 9.1 -9.2 -0.25 7.5 -1.8 -0.25 4.6
  [4,322,0,-0.25,6.2,-12,-0.25,9.1,-9.2,-0.25,7.5,-1.8,-0.25,4.6],
// 3 322 -9.2 -0.25 7.5 -6.3 -0.25 5.1 -1.8 -0.25 4.6
  [3,322,-9.2,-0.25,7.5,-6.3,-0.25,5.1,-1.8,-0.25,4.6],
// 3 322 -6.3 -0.25 5.1 -3.4 -0.25 2 -1.8 -0.25 4.6
  [3,322,-6.3,-0.25,5.1,-3.4,-0.25,2,-1.8,-0.25,4.6],
// 3 322 -19 -0.25 16 -15 -0.25 10.1 -14.4 -0.25 10.4
  [3,322,-19,-0.25,16,-15,-0.25,10.1,-14.4,-0.25,10.4],
// 3 322 -19 -0.25 16 -15.2 -0.25 7.8 -15 -0.25 10.1
  [3,322,-19,-0.25,16,-15.2,-0.25,7.8,-15,-0.25,10.1],
// 4 322 -14.9 -0.25 4.9 -15.2 -0.25 7.8 -19 -0.25 16 -19 -0.25 -16
  [4,322,-14.9,-0.25,4.9,-15.2,-0.25,7.8,-19,-0.25,16,-19,-0.25,-16],
// 4 322 -14.1 -0.25 1.9 -14.9 -0.25 4.9 -19 -0.25 -16 -14.1 -0.25 0.5
  [4,322,-14.1,-0.25,1.9,-14.9,-0.25,4.9,-19,-0.25,-16,-14.1,-0.25,0.5],
// 3 322 -14.1 -0.25 0.5 -19 -0.25 -16 -13.4 -0.25 -2
  [3,322,-14.1,-0.25,0.5,-19,-0.25,-16,-13.4,-0.25,-2],
// 4 322 -12.5 -0.25 -3.9 -13.4 -0.25 -2 -19 -0.25 -16 -11.5 -0.25 -6.5
  [4,322,-12.5,-0.25,-3.9,-13.4,-0.25,-2,-19,-0.25,-16,-11.5,-0.25,-6.5],
// 3 322 -12.5 -0.25 -3.9 -11.5 -0.25 -6.5 -11.3 -0.25 -5.7
  [3,322,-12.5,-0.25,-3.9,-11.5,-0.25,-6.5,-11.3,-0.25,-5.7],
// 3 322 -11.5 -0.25 -6.5 -19 -0.25 -16 -11 -0.25 -7.7
  [3,322,-11.5,-0.25,-6.5,-19,-0.25,-16,-11,-0.25,-7.7],
// 3 322 -11 -0.25 -7.7 -19 -0.25 -16 -8.6 -0.25 -10.5
  [3,322,-11,-0.25,-7.7,-19,-0.25,-16,-8.6,-0.25,-10.5],
// 3 322 -8.6 -0.25 -10.5 -19 -0.25 -16 -7.6 -0.25 -10.9
  [3,322,-8.6,-0.25,-10.5,-19,-0.25,-16,-7.6,-0.25,-10.9],
// 4 322 -5.4 -0.25 -10.7 -7.6 -0.25 -10.9 -19 -0.25 -16 -4.3 -0.25 -11.2
  [4,322,-5.4,-0.25,-10.7,-7.6,-0.25,-10.9,-19,-0.25,-16,-4.3,-0.25,-11.2],
// 3 322 -5.8 -0.25 -9.6 -7.6 -0.25 -10.9 -5.4 -0.25 -10.7
  [3,322,-5.8,-0.25,-9.6,-7.6,-0.25,-10.9,-5.4,-0.25,-10.7],
// 4 322 -4.3 -0.25 -11.2 -19 -0.25 -16 4.3 -0.25 -11.2 1.9 -0.25 -10.8
  [4,322,-4.3,-0.25,-11.2,-19,-0.25,-16,4.3,-0.25,-11.2,1.9,-0.25,-10.8],
// 3 322 1.9 -0.25 -10.8 -1.9 -0.25 -10.8 -4.3 -0.25 -11.2
  [3,322,1.9,-0.25,-10.8,-1.9,-0.25,-10.8,-4.3,-0.25,-11.2],
// 3 322 0 -0.25 -9.9 -1.9 -0.25 -10.8 1.9 -0.25 -10.8
  [3,322,0,-0.25,-9.9,-1.9,-0.25,-10.8,1.9,-0.25,-10.8],
// 4 322 4.3 -0.25 -11.2 -19 -0.25 -16 19 -0.25 -16 7.6 -0.25 -10.9
  [4,322,4.3,-0.25,-11.2,-19,-0.25,-16,19,-0.25,-16,7.6,-0.25,-10.9],
// 3 322 5.4 -0.25 -10.7 4.3 -0.25 -11.2 7.6 -0.25 -10.9
  [3,322,5.4,-0.25,-10.7,4.3,-0.25,-11.2,7.6,-0.25,-10.9],
// 3 322 5.8 -0.25 -9.6 5.4 -0.25 -10.7 7.6 -0.25 -10.9
  [3,322,5.8,-0.25,-9.6,5.4,-0.25,-10.7,7.6,-0.25,-10.9],
// 3 322 8.6 -0.25 -10.5 7.6 -0.25 -10.9 19 -0.25 -16
  [3,322,8.6,-0.25,-10.5,7.6,-0.25,-10.9,19,-0.25,-16],
// 3 322 11 -0.25 -7.7 8.6 -0.25 -10.5 19 -0.25 -16
  [3,322,11,-0.25,-7.7,8.6,-0.25,-10.5,19,-0.25,-16],
// 3 322 11.5 -0.25 -6.5 11 -0.25 -7.7 19 -0.25 -16
  [3,322,11.5,-0.25,-6.5,11,-0.25,-7.7,19,-0.25,-16],
// 4 322 11.5 -0.25 -6.5 19 -0.25 -16 12.5 -0.25 -3.9 11.3 -0.25 -5.7
  [4,322,11.5,-0.25,-6.5,19,-0.25,-16,12.5,-0.25,-3.9,11.3,-0.25,-5.7],
// 3 322 13.4 -0.25 -2 12.5 -0.25 -3.9 19 -0.25 -16
  [3,322,13.4,-0.25,-2,12.5,-0.25,-3.9,19,-0.25,-16],
// 3 322 14.1 -0.25 0.5 13.4 -0.25 -2 19 -0.25 -16
  [3,322,14.1,-0.25,0.5,13.4,-0.25,-2,19,-0.25,-16],
// 4 322 14.1 -0.25 1.9 14.1 -0.25 0.5 19 -0.25 -16 14.9 -0.25 4.9
  [4,322,14.1,-0.25,1.9,14.1,-0.25,0.5,19,-0.25,-16,14.9,-0.25,4.9],
// 4 322 14.9 -0.25 4.9 19 -0.25 -16 19 -0.25 16 15.2 -0.25 7.8
  [4,322,14.9,-0.25,4.9,19,-0.25,-16,19,-0.25,16,15.2,-0.25,7.8],
// 3 322 19 -0.25 16 15 -0.25 10.1 15.2 -0.25 7.8
  [3,322,19,-0.25,16,15,-0.25,10.1,15.2,-0.25,7.8],
// 3 322 19 -0.25 16 14.4 -0.25 10.4 15 -0.25 10.1
  [3,322,19,-0.25,16,14.4,-0.25,10.4,15,-0.25,10.1],
// 4 322 14.4 -0.25 10.4 19 -0.25 16 0 -0.25 6.2 12 -0.25 9.1
  [4,322,14.4,-0.25,10.4,19,-0.25,16,0,-0.25,6.2,12,-0.25,9.1],
// 4 322 9.2 -0.25 7.5 12 -0.25 9.1 0 -0.25 6.2 1.8 -0.25 4.6
  [4,322,9.2,-0.25,7.5,12,-0.25,9.1,0,-0.25,6.2,1.8,-0.25,4.6],
// 3 322 9.2 -0.25 7.5 1.8 -0.25 4.6 6.3 -0.25 5.1
  [3,322,9.2,-0.25,7.5,1.8,-0.25,4.6,6.3,-0.25,5.1],
// 3 322 6.3 -0.25 5.1 1.8 -0.25 4.6 3.4 -0.25 2
  [3,322,6.3,-0.25,5.1,1.8,-0.25,4.6,3.4,-0.25,2],
];
makepoly(ldraw_lib__4650853k(), line=0.2);
